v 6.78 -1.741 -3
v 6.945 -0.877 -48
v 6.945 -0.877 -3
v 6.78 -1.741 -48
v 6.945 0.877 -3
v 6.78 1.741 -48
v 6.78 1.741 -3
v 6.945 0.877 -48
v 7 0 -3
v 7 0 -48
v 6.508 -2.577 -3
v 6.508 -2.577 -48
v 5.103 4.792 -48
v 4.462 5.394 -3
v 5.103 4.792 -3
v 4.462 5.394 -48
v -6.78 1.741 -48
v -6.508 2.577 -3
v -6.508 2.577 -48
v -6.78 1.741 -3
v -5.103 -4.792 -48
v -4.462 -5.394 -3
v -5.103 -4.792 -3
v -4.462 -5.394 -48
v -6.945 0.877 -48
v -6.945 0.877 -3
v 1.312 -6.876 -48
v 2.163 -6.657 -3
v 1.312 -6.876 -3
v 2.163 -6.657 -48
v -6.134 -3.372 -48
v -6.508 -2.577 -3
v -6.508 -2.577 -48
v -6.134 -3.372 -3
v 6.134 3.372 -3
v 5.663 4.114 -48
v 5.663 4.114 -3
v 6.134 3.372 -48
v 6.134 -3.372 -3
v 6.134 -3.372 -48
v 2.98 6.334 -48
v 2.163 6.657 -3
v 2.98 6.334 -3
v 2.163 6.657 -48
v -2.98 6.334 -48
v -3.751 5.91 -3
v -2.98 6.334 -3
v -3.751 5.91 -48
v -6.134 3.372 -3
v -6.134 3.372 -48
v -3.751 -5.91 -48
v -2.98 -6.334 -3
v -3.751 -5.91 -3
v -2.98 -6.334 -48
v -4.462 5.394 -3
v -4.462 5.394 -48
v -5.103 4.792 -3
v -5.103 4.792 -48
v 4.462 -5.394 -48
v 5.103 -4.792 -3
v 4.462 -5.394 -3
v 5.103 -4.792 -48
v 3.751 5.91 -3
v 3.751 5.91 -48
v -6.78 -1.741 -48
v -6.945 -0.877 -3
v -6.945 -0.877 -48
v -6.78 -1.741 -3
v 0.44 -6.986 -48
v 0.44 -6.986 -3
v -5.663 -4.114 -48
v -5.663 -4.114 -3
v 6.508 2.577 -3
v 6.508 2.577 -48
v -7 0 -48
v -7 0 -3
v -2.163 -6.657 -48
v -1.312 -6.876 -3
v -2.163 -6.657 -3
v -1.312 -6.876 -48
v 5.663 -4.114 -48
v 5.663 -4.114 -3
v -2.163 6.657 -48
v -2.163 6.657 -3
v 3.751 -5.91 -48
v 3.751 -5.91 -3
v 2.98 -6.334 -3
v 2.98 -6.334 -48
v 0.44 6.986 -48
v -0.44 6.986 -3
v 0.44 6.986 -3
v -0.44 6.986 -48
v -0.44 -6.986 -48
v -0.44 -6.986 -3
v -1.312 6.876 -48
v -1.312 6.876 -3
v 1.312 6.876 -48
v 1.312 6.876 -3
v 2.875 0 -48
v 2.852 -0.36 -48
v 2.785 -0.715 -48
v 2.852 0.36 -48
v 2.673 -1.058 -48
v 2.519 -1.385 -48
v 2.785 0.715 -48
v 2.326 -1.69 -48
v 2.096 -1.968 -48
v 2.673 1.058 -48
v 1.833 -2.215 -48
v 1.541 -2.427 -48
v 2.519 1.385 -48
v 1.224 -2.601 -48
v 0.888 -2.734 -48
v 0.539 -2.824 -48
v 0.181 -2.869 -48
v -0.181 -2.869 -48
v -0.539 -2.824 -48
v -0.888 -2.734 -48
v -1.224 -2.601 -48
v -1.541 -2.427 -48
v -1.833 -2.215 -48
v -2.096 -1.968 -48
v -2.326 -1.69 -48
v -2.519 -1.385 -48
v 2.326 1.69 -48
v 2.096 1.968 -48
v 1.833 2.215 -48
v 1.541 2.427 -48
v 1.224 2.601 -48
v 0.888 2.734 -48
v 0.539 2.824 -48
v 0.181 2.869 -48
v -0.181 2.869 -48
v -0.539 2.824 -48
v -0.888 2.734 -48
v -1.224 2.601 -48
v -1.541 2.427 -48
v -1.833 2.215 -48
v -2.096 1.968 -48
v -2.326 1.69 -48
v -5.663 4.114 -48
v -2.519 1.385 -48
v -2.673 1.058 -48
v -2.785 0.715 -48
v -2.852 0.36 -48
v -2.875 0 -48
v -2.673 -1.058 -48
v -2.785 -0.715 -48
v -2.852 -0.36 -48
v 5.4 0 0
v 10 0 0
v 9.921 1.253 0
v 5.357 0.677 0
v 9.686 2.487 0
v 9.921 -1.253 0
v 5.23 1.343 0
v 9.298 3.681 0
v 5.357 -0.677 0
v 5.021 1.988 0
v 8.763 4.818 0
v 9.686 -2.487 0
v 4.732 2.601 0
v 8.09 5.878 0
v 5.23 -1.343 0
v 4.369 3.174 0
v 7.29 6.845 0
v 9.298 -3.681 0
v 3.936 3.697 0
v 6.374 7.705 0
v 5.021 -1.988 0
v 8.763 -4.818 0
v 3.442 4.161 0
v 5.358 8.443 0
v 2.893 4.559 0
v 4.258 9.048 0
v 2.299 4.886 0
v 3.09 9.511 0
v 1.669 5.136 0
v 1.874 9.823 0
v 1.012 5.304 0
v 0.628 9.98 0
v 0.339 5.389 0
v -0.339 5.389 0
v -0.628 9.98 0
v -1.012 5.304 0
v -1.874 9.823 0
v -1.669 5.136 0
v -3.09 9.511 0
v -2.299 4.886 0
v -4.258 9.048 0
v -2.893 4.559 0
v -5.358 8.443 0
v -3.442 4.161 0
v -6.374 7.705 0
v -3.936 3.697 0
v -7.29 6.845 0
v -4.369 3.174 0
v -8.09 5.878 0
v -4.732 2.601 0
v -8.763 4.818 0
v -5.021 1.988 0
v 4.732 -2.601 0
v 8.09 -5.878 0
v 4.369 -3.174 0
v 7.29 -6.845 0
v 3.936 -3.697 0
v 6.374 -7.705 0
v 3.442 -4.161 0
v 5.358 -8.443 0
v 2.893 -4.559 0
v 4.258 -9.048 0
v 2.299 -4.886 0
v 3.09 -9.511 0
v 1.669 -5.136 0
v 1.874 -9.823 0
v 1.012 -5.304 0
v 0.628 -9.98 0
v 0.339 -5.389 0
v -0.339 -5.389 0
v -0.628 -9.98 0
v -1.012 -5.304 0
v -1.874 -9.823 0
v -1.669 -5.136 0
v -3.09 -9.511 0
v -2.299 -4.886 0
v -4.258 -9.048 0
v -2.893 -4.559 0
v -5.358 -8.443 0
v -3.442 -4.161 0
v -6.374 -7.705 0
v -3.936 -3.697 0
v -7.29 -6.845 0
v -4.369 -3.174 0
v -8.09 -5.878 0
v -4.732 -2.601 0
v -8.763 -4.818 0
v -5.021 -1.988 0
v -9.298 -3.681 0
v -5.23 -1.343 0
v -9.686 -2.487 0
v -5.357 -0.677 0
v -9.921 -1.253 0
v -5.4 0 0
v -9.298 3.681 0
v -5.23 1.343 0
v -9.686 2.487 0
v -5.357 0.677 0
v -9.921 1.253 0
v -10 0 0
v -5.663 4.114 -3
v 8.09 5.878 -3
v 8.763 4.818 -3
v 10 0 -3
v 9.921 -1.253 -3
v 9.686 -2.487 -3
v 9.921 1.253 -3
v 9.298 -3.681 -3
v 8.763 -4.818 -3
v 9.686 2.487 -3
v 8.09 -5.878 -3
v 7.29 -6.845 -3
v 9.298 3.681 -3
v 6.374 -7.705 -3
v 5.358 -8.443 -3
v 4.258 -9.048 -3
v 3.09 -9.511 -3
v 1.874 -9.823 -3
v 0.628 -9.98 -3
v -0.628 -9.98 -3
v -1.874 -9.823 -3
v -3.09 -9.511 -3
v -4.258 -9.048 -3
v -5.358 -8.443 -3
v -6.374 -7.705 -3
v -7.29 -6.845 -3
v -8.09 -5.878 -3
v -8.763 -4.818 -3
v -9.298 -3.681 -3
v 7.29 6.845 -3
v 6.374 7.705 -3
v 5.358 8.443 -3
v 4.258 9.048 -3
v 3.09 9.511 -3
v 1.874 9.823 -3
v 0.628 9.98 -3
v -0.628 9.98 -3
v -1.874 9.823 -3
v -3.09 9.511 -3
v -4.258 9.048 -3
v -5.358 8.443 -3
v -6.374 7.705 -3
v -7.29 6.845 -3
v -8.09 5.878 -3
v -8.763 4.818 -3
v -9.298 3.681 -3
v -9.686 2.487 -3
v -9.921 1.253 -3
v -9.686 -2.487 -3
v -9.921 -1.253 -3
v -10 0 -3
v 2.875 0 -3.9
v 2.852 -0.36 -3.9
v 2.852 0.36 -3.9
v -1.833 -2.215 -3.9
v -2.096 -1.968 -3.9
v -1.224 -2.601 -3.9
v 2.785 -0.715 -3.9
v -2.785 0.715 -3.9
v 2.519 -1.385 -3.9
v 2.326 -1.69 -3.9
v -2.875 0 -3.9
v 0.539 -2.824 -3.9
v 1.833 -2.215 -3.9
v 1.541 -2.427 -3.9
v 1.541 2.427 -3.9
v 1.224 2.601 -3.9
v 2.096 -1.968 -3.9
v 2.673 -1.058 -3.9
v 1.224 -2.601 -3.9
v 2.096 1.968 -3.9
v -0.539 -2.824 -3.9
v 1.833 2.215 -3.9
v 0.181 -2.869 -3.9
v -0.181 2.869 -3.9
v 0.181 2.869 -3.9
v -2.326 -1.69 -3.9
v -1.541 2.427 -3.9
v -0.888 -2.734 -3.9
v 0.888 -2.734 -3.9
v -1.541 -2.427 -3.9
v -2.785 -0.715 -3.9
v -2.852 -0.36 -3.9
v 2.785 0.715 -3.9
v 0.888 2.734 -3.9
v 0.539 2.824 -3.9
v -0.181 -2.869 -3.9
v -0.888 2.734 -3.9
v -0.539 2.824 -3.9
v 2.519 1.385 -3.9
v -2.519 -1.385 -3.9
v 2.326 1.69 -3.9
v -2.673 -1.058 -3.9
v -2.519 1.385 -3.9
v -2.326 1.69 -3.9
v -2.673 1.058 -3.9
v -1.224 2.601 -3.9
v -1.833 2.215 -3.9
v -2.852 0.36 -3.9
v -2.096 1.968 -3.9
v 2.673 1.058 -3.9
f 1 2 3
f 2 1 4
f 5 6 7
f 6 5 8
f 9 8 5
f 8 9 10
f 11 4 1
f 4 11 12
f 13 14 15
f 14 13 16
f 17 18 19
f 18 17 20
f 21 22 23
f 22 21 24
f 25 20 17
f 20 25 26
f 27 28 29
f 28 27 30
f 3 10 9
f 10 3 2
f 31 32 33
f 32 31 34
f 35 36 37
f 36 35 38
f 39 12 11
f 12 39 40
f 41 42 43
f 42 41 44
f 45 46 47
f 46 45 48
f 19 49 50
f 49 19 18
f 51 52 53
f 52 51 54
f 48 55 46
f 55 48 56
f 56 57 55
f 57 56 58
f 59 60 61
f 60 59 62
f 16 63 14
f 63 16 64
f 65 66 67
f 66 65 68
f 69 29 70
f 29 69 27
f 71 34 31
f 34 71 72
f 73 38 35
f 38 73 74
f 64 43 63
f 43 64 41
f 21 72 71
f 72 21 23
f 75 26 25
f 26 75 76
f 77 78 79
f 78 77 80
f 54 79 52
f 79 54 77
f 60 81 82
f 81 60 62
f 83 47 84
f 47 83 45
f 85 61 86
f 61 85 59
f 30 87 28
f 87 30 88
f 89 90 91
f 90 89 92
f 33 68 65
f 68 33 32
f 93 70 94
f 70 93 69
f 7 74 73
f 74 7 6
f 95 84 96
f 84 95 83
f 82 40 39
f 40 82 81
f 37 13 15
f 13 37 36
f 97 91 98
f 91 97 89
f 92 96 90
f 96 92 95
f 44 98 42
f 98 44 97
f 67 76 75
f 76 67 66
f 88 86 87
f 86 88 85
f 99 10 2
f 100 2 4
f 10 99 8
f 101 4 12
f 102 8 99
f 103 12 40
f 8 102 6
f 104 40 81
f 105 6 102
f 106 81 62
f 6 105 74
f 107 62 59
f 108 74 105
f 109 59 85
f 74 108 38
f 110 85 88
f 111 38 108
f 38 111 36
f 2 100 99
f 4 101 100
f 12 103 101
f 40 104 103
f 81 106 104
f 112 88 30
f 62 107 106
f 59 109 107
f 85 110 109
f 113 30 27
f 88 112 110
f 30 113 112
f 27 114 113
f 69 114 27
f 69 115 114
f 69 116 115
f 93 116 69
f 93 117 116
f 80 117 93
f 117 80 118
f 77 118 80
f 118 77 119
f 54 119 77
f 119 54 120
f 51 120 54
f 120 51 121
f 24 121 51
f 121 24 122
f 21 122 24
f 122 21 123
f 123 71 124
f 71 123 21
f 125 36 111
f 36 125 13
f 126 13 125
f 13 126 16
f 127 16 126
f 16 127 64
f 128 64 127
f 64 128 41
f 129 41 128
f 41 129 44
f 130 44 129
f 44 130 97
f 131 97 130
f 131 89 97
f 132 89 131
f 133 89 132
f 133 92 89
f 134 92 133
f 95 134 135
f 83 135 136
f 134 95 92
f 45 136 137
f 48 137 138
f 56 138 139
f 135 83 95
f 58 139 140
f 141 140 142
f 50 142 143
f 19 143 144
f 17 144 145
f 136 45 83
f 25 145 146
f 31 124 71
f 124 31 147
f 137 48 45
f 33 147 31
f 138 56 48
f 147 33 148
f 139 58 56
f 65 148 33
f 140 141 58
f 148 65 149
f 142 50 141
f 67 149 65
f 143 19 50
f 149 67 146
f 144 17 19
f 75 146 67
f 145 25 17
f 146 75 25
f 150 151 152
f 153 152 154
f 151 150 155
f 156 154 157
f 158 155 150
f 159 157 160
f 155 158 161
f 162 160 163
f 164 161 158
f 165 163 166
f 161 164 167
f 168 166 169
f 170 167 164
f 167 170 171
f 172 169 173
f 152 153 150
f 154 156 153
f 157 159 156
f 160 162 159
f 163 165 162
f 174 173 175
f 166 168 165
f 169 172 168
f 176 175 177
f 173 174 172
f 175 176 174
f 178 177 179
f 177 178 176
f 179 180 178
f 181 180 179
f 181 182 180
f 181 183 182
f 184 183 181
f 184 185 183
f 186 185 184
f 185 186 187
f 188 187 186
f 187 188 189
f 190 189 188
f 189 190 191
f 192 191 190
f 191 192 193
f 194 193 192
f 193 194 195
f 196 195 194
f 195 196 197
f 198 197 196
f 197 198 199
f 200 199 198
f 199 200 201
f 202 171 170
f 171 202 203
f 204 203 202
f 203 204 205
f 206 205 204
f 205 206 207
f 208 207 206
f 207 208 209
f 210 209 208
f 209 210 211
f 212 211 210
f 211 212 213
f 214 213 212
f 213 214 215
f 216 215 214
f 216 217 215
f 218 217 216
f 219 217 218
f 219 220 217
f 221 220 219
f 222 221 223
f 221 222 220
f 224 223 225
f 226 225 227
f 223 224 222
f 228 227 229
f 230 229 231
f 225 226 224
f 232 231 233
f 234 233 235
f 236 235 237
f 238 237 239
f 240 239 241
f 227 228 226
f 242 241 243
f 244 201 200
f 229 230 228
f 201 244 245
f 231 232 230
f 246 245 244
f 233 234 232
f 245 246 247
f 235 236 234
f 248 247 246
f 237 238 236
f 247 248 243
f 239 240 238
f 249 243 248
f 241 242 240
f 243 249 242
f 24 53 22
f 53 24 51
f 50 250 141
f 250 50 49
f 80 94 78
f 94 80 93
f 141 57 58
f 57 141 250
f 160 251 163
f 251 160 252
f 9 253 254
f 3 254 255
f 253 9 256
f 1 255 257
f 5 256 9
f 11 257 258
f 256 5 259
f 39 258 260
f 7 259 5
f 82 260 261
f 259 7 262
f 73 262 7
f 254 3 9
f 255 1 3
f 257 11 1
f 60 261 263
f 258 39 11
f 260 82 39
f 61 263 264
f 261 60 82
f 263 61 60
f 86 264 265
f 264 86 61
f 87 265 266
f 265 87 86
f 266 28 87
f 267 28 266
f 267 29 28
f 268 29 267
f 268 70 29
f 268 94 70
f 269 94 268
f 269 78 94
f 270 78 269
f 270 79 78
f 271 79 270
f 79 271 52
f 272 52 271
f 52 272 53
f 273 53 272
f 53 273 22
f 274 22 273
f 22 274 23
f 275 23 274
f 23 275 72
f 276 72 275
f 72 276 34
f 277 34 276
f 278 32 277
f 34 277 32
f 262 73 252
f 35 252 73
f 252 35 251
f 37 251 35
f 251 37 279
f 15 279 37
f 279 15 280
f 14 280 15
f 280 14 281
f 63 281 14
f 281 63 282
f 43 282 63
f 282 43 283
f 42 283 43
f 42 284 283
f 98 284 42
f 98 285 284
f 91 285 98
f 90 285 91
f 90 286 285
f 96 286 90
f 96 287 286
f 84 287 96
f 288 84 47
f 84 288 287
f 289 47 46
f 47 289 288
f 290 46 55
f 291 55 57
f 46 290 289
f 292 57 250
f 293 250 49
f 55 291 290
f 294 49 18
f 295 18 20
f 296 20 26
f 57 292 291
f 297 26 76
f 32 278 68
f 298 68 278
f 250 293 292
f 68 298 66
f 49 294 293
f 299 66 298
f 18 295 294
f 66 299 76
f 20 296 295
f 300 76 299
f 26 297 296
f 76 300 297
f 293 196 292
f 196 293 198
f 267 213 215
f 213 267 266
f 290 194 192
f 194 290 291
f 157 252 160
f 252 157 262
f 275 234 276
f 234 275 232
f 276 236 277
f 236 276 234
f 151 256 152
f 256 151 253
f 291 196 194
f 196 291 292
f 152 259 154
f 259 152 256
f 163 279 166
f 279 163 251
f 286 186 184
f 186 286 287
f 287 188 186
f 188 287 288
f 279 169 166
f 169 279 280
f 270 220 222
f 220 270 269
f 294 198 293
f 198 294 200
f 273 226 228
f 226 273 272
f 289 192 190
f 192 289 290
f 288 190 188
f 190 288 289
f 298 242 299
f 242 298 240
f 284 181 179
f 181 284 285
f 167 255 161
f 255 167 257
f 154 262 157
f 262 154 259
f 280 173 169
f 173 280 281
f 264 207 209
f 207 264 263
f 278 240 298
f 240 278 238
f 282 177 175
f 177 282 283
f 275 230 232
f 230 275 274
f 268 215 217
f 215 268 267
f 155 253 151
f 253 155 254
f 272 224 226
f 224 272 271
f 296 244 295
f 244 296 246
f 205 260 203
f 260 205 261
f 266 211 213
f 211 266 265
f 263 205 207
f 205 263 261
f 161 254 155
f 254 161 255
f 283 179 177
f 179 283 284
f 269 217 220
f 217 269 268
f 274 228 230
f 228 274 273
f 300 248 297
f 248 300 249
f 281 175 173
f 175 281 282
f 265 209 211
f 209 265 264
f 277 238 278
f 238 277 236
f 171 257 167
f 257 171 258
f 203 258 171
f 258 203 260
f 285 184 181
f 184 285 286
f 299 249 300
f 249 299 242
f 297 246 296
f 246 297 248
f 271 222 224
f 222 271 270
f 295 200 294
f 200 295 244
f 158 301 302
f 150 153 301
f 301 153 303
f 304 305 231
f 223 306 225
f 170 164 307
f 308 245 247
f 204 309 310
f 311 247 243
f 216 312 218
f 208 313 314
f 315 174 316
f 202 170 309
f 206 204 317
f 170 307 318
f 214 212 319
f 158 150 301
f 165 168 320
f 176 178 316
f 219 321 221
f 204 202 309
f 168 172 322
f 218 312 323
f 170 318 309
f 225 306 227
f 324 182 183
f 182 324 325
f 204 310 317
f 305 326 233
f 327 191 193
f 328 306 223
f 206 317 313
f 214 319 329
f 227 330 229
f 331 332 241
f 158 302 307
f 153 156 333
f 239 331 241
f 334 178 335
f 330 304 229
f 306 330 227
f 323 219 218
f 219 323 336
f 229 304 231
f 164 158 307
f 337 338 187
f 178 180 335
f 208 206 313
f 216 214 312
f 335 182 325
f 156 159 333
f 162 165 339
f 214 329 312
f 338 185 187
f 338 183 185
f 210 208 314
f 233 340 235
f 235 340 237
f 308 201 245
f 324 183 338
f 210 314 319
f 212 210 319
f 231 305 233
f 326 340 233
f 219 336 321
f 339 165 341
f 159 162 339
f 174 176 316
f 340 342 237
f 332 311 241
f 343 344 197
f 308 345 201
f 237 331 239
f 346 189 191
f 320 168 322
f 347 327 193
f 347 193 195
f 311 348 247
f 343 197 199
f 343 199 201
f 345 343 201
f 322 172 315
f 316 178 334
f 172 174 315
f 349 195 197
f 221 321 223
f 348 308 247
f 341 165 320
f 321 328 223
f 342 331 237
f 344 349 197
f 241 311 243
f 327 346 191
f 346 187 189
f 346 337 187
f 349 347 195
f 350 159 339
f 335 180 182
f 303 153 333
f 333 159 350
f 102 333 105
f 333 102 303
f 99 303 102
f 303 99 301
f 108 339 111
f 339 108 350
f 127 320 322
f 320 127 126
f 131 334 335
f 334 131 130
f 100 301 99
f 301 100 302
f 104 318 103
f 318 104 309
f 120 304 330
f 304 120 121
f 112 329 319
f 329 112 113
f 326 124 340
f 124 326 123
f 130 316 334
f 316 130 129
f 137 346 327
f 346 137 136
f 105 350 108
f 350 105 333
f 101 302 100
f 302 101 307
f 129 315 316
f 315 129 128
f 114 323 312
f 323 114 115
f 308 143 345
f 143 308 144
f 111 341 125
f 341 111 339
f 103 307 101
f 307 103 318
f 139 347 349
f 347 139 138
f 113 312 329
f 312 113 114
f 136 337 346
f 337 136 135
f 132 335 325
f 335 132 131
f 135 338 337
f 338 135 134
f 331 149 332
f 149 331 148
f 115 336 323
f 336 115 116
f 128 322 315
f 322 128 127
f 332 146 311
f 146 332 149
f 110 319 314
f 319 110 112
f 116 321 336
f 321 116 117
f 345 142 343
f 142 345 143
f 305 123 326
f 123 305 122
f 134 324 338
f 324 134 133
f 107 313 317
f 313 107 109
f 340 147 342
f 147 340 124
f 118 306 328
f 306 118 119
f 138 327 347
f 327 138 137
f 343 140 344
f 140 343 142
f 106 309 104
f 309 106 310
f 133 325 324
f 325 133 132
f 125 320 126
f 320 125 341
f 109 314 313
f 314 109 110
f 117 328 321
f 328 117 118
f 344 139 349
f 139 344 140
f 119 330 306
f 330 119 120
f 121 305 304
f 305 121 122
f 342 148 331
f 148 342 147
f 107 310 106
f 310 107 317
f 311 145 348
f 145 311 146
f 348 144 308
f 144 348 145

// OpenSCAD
$fn = 50;


difference() {
	union() {
		translate(v = [0, 0, -48.0000000000]) {
			cylinder(h = 48, r = 7.0000000000);
		}
		translate(v = [0, 0, -3.0000000000]) {
			cylinder(h = 3, r = 10.0000000000);
		}
	}
	union() {
		translate(v = [0, 0, 0]) {
			rotate(a = [0, 0, 0]) {
				difference() {
					union() {
						#translate(v = [0, 0, -48.0000000000]) {
							cylinder(h = 48, r = 2.6000000000);
						}
						#translate(v = [0, 0, -3.9000000000]) {
							cylinder(h = 3.9000000000, r = 7.0000000000, r1 = 2.8750000000, r2 = 5.4000000000);
						}
						#translate(v = [0, 0, -48.0000000000]) {
							cylinder(h = 48, r = 2.8750000000);
						}
						#translate(v = [0, 0, -48.0000000000]) {
							cylinder(h = 48, r = 2.6000000000);
						}
					}
					union();
				}
			}
		}
	}
}
